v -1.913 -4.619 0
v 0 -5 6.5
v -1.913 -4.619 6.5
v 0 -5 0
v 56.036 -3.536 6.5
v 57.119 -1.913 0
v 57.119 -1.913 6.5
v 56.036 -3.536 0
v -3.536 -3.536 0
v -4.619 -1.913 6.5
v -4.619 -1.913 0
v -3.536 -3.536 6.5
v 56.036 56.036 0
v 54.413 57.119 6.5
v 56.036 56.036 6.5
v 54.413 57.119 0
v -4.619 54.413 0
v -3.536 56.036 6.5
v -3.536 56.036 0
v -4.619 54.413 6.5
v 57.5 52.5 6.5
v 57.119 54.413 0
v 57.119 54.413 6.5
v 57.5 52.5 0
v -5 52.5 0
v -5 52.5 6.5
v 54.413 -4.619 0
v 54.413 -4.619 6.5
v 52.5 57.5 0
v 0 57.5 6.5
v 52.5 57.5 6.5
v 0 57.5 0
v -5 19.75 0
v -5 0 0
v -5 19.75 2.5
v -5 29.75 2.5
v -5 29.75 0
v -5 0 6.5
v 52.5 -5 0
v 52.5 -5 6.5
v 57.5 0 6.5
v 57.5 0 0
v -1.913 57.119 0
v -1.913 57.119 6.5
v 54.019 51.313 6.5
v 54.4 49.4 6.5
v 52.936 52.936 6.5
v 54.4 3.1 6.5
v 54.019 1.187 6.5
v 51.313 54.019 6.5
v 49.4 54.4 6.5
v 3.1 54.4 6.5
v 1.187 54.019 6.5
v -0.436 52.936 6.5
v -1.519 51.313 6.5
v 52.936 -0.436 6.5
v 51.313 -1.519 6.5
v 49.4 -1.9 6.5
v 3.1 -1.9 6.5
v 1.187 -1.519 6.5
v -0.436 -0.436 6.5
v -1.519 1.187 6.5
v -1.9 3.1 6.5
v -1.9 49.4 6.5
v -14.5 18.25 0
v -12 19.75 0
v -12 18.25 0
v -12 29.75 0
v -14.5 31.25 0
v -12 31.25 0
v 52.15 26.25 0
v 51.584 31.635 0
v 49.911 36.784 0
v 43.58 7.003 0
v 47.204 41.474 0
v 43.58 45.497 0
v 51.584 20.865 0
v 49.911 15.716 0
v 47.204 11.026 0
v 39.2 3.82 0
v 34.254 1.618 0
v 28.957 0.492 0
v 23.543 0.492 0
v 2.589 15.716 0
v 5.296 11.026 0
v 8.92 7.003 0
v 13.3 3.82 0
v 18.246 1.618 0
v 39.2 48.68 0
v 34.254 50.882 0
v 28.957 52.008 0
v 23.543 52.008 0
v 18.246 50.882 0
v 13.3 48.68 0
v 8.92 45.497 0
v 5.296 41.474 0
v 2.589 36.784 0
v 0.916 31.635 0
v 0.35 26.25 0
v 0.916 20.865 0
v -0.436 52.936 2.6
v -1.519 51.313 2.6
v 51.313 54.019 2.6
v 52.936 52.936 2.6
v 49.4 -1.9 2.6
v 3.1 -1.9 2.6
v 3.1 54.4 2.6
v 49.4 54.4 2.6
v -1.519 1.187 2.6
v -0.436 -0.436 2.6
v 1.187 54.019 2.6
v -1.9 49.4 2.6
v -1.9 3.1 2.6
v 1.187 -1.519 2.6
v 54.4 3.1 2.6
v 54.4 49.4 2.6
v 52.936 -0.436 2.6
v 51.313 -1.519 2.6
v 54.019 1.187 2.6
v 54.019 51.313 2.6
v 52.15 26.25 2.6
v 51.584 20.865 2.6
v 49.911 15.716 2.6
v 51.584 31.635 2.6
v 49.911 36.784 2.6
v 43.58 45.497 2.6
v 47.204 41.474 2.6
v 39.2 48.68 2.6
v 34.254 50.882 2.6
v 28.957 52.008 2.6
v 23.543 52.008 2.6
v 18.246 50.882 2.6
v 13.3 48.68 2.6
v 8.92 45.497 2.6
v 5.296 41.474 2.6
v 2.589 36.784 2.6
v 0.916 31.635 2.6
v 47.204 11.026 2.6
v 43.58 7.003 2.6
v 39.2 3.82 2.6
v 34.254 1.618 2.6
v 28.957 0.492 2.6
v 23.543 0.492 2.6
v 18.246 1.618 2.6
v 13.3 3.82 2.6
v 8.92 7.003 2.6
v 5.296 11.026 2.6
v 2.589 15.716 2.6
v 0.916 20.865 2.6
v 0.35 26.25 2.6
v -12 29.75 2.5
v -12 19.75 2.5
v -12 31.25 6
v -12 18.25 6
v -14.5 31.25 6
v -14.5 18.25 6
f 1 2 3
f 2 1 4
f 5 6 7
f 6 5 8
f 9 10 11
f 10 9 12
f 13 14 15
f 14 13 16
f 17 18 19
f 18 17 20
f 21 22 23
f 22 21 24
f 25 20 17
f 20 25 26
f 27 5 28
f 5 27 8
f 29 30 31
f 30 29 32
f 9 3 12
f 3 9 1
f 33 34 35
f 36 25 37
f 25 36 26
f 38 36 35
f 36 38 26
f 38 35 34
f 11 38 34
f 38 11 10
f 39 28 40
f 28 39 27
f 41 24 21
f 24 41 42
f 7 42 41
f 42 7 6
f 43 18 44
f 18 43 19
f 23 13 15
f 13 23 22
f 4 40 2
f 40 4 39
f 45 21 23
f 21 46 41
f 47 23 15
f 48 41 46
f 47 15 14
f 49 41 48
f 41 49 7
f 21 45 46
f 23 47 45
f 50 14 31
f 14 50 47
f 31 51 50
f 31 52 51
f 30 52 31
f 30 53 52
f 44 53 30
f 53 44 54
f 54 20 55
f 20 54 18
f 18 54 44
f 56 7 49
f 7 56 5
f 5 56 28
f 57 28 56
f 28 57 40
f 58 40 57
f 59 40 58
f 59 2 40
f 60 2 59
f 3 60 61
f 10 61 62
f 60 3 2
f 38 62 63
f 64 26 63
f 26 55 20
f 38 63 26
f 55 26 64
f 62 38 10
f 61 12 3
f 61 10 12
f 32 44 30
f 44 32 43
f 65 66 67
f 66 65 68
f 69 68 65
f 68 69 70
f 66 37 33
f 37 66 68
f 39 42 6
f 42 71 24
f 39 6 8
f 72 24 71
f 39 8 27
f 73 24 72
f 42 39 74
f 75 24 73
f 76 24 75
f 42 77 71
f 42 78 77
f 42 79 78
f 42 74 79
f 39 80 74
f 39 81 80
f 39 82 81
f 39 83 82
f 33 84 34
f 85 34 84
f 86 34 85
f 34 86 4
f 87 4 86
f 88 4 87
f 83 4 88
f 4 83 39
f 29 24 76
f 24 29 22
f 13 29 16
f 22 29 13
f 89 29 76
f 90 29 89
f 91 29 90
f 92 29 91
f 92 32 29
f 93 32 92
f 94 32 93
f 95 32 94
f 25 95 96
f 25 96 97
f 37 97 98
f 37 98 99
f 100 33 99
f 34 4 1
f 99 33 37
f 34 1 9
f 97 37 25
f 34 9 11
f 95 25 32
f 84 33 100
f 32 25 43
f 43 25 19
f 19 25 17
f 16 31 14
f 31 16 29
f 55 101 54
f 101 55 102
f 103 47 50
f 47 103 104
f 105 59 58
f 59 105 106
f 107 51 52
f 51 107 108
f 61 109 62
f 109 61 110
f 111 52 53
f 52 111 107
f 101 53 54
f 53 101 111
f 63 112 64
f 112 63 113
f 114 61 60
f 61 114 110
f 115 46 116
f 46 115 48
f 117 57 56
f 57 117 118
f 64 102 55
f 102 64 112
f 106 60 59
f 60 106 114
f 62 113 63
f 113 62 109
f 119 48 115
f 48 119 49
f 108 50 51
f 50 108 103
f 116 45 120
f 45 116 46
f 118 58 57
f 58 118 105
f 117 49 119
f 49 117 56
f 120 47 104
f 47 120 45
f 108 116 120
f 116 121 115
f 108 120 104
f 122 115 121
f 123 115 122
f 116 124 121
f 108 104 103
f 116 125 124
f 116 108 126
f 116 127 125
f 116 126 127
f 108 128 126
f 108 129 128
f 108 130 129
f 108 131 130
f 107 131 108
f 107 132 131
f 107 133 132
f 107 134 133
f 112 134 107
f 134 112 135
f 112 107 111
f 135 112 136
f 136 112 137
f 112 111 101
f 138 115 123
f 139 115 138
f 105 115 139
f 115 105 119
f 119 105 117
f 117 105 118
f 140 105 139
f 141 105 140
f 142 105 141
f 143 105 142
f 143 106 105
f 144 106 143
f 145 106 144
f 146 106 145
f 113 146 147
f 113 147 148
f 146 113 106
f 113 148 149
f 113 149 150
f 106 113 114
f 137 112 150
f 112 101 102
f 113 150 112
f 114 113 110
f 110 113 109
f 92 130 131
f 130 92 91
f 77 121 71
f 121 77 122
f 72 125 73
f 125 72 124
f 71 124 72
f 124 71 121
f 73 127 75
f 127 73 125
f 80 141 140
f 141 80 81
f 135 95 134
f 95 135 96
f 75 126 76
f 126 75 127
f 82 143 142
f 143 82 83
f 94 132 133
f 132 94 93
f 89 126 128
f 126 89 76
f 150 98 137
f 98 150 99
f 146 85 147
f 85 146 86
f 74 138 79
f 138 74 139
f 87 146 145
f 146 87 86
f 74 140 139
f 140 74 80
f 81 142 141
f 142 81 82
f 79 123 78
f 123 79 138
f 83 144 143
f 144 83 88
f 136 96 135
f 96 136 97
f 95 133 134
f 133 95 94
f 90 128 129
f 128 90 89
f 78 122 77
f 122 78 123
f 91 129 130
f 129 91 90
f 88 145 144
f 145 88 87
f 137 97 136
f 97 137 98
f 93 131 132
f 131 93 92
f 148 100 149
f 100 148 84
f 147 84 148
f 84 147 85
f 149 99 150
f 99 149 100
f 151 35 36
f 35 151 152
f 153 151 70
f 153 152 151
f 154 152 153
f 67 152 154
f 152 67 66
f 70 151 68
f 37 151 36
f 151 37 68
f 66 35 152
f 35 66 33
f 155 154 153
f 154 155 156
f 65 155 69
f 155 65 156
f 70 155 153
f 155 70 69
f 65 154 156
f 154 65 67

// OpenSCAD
union(){
    // tray
    difference(){
      difference(){
        // tray outer
        minkowski()
        {
          cube([52.5,52.5,5.5]);
          cylinder(r=5,h=1);
        }
        // tray inner void
        translate([3.1,3.1,2.6]){
          minkowski()
          {
            cube([46.3,46.3,5.5]);
            cylinder(r=5,h=1);
          }
        }
      };
      // central hole
      translate([26.25,26.25,-5]){
        cylinder(h=10,r=(51.8/2));
      };
    }
    
    // handle
    translate([-12,((52.5 - 13)/2),0]){
        union(){
            //stem
            cube([11,10,2.5]);
            //handle
            translate([-2.5,-1.5,0]){
                cube([2.5,13,6]);
            
            }
        }
    }
}
